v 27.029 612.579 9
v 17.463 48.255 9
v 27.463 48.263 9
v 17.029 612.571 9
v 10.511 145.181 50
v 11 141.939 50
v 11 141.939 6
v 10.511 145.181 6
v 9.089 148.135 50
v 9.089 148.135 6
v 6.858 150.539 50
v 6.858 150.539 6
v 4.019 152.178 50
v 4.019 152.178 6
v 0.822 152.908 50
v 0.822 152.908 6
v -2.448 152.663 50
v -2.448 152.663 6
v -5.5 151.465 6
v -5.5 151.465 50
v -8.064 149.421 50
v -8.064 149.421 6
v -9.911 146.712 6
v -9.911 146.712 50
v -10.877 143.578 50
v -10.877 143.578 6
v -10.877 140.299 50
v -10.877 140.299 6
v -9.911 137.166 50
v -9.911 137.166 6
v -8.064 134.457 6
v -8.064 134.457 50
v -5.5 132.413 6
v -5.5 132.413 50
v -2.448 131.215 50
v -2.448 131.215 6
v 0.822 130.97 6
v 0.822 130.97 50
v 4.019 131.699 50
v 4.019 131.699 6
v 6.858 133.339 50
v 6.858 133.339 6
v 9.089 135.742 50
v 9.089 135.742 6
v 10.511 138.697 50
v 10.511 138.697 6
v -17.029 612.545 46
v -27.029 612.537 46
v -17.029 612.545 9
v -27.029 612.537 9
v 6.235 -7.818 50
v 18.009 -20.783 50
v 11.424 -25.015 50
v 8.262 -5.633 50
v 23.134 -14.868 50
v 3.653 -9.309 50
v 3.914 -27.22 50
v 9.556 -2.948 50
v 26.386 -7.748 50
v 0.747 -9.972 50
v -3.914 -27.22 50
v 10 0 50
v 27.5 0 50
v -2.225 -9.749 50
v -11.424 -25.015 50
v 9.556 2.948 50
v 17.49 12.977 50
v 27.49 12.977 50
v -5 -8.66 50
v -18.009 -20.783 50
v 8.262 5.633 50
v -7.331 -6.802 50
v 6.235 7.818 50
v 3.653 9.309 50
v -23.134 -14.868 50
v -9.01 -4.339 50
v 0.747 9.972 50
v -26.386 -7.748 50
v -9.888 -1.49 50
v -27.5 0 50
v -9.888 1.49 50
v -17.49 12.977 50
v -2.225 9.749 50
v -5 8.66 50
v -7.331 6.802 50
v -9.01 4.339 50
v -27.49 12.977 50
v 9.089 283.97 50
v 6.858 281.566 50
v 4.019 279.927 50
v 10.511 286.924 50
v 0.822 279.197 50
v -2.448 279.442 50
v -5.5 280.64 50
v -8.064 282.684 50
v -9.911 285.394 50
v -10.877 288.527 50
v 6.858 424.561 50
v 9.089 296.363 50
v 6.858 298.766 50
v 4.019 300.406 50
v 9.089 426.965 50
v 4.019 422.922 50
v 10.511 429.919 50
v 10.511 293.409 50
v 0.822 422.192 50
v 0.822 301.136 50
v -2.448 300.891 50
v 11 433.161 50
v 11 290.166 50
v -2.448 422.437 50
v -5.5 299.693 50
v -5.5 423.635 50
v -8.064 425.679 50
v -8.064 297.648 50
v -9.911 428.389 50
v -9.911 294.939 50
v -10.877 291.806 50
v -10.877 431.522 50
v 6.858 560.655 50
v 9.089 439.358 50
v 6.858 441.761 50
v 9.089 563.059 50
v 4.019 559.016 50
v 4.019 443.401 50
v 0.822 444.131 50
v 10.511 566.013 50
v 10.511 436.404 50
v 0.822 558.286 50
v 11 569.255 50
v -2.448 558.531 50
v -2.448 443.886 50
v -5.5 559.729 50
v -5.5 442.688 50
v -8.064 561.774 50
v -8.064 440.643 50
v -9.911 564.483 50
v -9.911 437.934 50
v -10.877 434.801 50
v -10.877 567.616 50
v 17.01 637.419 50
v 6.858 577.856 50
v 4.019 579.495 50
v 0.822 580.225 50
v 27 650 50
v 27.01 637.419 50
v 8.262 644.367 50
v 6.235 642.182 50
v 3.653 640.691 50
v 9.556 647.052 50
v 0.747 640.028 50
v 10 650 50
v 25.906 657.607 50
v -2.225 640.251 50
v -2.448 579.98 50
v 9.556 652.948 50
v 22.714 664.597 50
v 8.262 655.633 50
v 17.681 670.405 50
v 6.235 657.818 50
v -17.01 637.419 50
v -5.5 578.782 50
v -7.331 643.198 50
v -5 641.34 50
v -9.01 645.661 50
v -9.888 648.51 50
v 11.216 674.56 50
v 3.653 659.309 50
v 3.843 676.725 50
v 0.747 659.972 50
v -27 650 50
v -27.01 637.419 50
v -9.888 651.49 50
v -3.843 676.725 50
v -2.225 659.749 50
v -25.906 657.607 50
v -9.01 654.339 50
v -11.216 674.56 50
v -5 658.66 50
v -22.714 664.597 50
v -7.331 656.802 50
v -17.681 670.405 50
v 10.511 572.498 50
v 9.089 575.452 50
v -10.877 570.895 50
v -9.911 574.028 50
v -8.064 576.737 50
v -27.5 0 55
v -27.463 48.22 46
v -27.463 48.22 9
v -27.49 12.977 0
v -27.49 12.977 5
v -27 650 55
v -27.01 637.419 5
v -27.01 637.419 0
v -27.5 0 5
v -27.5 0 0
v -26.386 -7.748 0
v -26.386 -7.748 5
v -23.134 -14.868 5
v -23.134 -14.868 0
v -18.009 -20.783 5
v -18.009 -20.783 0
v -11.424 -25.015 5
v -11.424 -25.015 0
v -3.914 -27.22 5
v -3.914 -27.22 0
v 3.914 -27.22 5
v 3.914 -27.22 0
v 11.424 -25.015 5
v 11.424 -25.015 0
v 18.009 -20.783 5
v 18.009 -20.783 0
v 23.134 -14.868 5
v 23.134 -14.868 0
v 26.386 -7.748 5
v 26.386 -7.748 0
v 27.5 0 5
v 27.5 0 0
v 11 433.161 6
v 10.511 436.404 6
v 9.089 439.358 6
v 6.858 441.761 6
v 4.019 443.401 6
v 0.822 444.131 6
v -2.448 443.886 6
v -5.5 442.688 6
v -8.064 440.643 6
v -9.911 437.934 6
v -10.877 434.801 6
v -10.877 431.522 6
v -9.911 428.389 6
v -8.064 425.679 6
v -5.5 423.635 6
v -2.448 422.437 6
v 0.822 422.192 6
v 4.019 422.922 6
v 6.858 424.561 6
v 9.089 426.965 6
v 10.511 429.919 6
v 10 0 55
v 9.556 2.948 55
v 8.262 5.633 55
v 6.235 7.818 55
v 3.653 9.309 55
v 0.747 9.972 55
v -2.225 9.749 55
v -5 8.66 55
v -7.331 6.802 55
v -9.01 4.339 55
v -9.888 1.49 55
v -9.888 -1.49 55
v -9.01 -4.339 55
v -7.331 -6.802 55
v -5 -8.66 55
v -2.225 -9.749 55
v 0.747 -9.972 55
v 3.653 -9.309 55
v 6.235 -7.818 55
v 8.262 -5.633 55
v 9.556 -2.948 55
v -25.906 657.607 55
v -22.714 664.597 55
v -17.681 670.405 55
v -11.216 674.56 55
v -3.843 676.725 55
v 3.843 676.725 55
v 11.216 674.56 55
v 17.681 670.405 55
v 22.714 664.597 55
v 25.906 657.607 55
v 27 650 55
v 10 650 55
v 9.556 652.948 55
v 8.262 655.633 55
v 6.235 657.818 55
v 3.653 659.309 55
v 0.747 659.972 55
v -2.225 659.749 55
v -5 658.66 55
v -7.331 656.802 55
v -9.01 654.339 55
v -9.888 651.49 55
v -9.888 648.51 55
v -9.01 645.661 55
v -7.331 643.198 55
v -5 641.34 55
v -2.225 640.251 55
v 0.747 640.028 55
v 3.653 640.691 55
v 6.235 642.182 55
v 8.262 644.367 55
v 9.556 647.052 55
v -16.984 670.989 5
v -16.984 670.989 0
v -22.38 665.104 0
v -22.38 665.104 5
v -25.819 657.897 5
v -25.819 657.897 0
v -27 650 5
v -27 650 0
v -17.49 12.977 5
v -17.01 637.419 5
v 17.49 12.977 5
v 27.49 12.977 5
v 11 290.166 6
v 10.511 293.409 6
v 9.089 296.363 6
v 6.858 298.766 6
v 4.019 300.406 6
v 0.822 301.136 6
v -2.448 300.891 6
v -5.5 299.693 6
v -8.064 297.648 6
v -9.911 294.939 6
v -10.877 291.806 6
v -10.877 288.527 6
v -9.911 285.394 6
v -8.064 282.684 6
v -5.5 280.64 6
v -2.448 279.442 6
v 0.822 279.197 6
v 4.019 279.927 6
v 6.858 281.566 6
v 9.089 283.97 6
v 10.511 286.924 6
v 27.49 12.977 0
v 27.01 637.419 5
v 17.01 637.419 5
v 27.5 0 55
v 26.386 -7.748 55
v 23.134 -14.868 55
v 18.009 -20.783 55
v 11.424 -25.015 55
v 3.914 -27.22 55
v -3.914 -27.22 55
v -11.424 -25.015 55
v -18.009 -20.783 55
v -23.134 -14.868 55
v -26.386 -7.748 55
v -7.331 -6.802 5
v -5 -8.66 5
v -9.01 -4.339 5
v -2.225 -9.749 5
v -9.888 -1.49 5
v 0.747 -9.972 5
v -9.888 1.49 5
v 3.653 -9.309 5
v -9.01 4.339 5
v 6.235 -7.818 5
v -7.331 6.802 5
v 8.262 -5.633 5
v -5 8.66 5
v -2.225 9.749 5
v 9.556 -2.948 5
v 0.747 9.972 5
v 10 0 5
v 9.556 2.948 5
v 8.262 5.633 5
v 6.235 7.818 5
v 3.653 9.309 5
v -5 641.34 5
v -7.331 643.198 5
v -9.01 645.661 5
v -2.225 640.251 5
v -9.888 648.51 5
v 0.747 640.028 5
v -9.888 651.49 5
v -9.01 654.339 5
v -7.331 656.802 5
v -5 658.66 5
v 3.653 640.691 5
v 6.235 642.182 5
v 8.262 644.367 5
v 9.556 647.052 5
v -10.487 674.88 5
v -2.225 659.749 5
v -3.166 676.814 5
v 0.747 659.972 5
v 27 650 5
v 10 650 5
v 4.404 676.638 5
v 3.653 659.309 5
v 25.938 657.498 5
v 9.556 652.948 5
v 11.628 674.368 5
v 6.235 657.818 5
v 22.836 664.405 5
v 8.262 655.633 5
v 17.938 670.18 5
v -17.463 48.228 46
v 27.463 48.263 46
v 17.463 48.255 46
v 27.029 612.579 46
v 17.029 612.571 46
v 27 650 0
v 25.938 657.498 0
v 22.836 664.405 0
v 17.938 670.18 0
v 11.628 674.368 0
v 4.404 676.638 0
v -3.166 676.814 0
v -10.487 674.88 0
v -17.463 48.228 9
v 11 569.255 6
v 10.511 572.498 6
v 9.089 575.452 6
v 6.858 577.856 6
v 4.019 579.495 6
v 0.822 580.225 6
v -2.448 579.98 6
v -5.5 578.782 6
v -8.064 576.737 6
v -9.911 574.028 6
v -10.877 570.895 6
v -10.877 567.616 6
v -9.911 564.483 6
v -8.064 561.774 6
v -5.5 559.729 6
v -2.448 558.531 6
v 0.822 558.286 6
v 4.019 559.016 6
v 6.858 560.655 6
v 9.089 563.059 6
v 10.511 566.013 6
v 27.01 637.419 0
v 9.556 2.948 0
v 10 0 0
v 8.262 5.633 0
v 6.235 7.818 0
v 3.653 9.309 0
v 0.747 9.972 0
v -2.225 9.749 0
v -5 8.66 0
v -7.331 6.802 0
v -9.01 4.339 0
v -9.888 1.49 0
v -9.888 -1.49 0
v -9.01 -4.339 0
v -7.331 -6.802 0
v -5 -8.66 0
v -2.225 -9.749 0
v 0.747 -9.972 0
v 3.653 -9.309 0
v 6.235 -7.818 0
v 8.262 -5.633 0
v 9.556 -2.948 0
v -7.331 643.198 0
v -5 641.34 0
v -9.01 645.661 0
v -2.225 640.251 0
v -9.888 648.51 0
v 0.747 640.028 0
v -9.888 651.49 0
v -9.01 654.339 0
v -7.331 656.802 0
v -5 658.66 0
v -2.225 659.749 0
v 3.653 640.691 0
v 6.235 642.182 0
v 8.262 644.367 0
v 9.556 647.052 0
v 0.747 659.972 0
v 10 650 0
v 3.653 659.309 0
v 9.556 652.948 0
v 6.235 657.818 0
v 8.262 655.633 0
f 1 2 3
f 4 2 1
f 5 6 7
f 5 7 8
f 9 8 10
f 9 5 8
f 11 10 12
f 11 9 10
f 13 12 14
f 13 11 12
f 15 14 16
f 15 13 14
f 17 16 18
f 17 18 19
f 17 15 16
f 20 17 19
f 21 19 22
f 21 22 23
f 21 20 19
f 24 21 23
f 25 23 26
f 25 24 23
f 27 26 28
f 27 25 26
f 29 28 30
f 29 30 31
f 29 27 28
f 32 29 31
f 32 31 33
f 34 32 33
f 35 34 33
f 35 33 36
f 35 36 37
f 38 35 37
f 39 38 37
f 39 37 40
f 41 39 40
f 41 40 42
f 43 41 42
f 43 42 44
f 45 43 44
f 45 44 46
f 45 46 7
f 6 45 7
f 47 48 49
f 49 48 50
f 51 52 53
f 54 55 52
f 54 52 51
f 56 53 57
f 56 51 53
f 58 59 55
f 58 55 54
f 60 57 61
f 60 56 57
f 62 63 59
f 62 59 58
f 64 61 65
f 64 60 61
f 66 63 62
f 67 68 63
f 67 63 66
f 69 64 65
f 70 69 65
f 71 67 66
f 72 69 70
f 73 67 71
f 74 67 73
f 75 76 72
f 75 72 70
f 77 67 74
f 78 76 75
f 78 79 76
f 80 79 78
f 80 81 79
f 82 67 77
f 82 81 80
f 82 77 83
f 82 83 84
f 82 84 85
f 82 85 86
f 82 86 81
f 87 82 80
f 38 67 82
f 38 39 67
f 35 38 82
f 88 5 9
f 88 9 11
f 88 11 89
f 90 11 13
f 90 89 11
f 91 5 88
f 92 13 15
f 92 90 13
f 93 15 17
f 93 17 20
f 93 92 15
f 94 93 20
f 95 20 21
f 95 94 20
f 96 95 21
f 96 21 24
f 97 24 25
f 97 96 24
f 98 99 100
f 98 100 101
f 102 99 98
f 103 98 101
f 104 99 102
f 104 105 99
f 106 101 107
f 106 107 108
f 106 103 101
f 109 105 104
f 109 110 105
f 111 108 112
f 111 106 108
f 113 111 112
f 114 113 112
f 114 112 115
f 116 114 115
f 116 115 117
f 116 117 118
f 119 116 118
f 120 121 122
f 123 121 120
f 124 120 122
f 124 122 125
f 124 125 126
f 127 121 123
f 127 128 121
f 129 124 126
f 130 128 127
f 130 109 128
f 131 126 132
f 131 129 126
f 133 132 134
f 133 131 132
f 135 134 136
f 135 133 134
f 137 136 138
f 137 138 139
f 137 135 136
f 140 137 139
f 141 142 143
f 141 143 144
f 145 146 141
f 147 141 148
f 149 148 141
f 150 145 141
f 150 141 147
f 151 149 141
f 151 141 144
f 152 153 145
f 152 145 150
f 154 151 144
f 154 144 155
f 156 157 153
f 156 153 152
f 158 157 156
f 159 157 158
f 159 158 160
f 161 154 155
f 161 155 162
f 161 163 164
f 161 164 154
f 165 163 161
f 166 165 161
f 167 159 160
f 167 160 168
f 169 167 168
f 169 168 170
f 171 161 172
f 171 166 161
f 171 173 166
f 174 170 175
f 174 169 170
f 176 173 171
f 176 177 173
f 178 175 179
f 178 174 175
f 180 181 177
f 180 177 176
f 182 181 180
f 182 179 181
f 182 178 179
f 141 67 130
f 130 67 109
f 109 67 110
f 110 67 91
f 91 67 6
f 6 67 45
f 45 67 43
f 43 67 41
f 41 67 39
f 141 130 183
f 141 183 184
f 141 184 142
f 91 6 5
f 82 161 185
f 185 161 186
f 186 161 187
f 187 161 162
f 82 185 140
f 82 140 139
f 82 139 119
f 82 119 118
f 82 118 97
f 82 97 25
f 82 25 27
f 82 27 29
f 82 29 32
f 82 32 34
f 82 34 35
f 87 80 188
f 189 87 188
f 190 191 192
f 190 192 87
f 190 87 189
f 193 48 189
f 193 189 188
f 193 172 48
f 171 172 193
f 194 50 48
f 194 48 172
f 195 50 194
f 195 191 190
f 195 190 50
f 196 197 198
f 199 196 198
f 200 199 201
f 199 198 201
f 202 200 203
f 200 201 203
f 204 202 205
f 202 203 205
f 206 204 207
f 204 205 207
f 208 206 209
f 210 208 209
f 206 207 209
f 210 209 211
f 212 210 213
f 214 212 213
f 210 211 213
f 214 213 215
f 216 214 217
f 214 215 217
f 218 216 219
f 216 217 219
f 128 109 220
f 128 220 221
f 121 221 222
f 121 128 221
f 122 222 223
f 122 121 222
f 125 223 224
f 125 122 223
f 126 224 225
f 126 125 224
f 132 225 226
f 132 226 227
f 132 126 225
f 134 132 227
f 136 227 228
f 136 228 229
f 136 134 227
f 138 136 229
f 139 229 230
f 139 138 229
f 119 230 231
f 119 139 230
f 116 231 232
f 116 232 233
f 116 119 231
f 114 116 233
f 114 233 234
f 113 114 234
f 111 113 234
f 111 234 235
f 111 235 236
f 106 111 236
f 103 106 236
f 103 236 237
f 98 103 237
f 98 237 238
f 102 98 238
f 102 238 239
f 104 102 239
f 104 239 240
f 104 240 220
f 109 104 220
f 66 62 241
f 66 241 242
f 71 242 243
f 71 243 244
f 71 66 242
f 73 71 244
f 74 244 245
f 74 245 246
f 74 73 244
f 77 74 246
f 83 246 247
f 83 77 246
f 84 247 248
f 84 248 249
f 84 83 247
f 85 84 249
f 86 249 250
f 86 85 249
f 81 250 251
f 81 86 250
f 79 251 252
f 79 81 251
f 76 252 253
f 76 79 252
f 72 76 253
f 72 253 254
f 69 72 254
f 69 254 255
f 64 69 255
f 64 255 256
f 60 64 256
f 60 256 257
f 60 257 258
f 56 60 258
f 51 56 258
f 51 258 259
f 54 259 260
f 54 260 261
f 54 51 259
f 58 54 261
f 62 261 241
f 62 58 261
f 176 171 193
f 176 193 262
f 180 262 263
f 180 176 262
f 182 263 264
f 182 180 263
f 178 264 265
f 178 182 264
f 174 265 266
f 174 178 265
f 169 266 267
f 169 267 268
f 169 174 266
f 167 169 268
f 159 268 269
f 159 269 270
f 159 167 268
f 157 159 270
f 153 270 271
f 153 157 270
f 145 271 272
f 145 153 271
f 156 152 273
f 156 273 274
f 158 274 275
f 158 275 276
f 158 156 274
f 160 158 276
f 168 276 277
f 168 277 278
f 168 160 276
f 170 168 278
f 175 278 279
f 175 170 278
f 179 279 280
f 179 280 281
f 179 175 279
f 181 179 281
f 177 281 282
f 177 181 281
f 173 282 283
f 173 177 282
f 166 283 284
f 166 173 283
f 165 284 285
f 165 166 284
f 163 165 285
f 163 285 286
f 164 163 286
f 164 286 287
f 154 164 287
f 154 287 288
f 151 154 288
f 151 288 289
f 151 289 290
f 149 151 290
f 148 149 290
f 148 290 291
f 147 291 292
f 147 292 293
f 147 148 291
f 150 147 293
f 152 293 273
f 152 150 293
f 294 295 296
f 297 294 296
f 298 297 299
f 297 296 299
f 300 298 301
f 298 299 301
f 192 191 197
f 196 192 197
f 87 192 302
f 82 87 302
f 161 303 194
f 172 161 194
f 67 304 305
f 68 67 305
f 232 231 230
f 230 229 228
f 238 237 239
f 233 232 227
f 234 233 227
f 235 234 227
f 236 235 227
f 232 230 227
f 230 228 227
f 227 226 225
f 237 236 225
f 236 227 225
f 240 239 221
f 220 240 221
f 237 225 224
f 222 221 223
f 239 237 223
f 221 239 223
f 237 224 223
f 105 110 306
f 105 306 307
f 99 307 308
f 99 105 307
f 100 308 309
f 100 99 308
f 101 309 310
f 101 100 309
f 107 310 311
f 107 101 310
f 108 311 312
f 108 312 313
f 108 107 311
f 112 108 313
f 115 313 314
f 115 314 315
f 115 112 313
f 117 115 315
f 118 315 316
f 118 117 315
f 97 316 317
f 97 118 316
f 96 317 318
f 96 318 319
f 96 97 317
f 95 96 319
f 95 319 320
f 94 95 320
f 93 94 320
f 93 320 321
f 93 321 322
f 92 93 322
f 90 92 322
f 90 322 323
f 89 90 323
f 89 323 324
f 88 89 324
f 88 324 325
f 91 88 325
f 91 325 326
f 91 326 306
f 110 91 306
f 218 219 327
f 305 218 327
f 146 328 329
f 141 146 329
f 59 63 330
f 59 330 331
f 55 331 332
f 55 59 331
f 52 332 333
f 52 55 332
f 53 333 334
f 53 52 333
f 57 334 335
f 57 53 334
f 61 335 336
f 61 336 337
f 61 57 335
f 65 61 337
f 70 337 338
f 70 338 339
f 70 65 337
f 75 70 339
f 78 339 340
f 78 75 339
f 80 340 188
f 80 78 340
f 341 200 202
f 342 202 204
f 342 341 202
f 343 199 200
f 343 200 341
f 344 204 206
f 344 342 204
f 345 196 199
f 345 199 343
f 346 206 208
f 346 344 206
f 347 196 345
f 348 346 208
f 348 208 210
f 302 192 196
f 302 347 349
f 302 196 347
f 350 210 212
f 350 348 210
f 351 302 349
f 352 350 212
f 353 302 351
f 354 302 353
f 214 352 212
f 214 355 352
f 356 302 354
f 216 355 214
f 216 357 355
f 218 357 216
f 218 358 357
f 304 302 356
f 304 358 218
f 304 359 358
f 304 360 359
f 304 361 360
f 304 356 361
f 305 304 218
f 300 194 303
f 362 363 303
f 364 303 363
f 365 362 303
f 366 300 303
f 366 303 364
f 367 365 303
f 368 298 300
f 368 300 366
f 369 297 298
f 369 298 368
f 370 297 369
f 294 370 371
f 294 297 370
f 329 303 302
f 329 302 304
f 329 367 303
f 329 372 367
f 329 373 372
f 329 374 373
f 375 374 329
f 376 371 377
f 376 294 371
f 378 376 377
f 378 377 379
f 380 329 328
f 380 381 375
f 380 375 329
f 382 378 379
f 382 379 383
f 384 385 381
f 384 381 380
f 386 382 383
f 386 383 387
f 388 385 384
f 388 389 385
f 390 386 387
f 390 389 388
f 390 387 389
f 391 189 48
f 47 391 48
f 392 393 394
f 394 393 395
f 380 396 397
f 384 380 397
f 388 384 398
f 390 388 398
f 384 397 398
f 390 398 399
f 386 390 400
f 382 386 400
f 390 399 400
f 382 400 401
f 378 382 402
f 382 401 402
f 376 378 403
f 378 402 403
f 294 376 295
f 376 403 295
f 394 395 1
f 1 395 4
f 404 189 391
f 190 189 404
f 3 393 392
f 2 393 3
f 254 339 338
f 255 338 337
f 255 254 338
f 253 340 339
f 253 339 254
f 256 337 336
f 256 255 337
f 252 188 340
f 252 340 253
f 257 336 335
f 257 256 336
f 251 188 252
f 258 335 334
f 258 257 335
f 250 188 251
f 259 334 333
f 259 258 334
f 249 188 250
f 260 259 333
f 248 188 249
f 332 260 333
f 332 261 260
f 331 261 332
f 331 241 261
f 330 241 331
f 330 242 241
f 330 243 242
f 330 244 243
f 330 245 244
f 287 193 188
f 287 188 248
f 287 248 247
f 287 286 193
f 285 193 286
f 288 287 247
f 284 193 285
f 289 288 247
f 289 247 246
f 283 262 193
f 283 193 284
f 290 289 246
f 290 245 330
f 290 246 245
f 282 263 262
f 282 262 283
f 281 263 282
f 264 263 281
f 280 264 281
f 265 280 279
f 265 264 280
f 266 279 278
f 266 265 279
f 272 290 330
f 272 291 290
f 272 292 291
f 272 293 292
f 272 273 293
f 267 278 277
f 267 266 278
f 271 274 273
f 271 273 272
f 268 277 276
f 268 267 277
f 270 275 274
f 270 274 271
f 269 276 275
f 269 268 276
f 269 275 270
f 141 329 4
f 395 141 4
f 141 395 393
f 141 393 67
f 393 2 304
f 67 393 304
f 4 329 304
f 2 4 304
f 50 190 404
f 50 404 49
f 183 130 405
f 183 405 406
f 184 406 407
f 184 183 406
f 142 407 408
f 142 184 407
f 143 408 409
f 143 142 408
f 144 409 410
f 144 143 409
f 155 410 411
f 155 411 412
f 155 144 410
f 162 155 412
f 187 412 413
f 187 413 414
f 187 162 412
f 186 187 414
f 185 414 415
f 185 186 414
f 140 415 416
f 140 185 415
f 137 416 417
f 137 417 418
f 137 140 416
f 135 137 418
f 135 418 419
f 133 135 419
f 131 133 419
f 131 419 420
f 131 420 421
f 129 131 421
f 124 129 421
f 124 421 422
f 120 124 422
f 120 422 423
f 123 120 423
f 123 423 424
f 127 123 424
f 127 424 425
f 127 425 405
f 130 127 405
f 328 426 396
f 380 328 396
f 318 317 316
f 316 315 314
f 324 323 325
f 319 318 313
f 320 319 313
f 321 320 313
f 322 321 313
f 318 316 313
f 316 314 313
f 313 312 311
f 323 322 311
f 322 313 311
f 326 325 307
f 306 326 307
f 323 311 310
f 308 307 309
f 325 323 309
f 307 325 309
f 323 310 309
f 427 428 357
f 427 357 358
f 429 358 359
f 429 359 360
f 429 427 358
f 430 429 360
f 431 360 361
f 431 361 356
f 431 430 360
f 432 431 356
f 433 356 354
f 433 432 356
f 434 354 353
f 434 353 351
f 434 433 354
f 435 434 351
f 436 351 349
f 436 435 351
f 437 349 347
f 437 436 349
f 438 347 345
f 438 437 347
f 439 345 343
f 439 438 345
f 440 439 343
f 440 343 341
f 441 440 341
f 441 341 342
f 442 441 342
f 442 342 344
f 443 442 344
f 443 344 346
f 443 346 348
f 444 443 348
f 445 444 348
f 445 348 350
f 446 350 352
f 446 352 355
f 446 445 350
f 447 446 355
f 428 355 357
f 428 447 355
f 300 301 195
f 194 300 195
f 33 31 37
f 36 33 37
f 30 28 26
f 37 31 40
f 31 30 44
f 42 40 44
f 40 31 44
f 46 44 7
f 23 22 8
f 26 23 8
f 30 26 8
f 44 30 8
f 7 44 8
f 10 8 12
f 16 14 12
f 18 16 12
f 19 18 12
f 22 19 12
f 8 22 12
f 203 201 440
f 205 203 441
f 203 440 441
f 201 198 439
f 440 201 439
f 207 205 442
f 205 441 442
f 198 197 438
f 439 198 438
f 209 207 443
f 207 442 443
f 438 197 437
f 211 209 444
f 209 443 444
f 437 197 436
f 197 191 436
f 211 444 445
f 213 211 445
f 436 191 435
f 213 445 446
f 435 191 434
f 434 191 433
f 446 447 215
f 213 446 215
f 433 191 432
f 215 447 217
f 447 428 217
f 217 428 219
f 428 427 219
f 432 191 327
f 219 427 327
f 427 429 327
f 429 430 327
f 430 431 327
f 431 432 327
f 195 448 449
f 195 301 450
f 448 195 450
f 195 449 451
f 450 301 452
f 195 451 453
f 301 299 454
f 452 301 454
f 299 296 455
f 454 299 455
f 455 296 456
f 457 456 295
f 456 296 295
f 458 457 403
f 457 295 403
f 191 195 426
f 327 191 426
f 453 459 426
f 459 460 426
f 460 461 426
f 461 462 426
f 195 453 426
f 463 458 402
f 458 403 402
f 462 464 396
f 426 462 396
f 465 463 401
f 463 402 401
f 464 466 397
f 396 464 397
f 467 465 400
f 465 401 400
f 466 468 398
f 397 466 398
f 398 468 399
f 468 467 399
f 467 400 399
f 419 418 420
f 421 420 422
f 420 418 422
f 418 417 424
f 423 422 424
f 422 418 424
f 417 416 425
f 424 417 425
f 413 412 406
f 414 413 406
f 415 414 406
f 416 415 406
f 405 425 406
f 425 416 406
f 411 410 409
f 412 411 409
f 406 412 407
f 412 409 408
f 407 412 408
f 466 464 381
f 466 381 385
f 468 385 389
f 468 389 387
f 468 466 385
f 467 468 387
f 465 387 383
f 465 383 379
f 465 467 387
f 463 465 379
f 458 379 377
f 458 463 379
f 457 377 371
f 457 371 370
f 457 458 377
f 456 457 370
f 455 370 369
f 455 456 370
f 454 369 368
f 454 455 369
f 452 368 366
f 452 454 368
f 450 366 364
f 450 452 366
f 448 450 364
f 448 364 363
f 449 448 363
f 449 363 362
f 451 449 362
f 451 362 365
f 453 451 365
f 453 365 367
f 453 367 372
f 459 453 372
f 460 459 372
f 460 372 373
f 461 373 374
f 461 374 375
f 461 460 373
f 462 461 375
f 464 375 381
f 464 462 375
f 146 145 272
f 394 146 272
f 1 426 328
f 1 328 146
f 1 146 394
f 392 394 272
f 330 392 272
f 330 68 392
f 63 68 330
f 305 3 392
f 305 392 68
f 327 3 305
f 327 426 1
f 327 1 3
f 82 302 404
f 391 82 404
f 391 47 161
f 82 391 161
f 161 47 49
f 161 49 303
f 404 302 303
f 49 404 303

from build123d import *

# Parameters (mm, degrees)
SKETCH1_R               = 10
BOSS_EXTRUDE2_DEPTH     = 5
BOSS_EXTRUDE3_DEPTH     = 55
BOSS_EXTRUDE4_START     = 50
SKETCH1_4_R             = 10
BOSS_EXTRUDE4_DEPTH     = 5
CUT_EXTRUDE1_DEPTH      = 682.432576538
CUT_EXTRUDE1_DEPTH_BACK = 682.432576538
SKETCH3_W               = 37
SKETCH3_H               = 564.316545641
SKETCH4_R               = 11
BOSS_EXTRUDE5_DEPTH     = 49


with BuildPart() as part:
    # Sketch1 → Boss-Extrude2 (new body)
    with BuildSketch(Plane.XY):
        with BuildLine():
            Line((27.00967764, 637.419067567), (27, 650))
            ThreePointArc((27, 650), (11.628325989, 674.367643191), (-16.983854422, 670.989251749))
            ThreePointArc((-16.983854422, 670.989251749), (-24.367643191, 661.628325989), (-27, 650))
            Line((-27, 650), (-27.00967764, 637.419067567))
            Line((-27.00967764, 637.419067567), (-17.00967764, 637.419067567))
            Line((-17.00967764, 637.419067567), (-17.490017949, 12.976666451))
            Line((-17.490017949, 12.976666451), (-27.490017949, 12.976666451))
            Line((-27.490017949, 12.976666451), (-27.5, 0))
            ThreePointArc((-27.5, 0), (0, -27.5), (27.5, 0))
            Line((27.5, 0), (27.490017949, 12.976666451))
            Line((27.490017949, 12.976666451), (17.490017949, 12.976666451))
            Line((17.490017949, 12.976666451), (17.00967764, 637.419067567))
            Line((17.00967764, 637.419067567), (27.00967764, 637.419067567))
        make_face()
        Circle(SKETCH1_R, mode=Mode.SUBTRACT)
        with Locations((0, 650)):
            Circle(SKETCH1_R, mode=Mode.SUBTRACT)
    extrude(amount=BOSS_EXTRUDE2_DEPTH)

    # Sketch1<3> → Boss-Extrude3 (add)
    with BuildSketch(Plane.XY):
        Polygon((27.490017949, 12.976666451), (27.00967764, 637.419067567), (17.00967764, 637.419067567), (17.490017949, 12.976666451), align=None)
        Polygon((-17.00967764, 637.419067567), (-27.00967764, 637.419067567), (-27.490017949, 12.976666451), (-17.490017949, 12.976666451), align=None)
    extrude(amount=BOSS_EXTRUDE3_DEPTH)

    # Sketch1<4> → Boss-Extrude4 (add)
    with BuildSketch(Plane.XY.offset(BOSS_EXTRUDE4_START)):
        with BuildLine():
            Line((27.00967764, 637.419067567), (27, 650))
            ThreePointArc((27, 650), (11.628325989, 674.367643191), (-16.983854422, 670.989251749))
            ThreePointArc((-16.983854422, 670.989251749), (-24.367643191, 661.628325989), (-27, 650))
            Line((-27, 650), (-27.00967764, 637.419067567))
            Line((-27.00967764, 637.419067567), (-17.00967764, 637.419067567))
            Line((-17.00967764, 637.419067567), (-17.490017949, 12.976666451))
            Line((-17.490017949, 12.976666451), (-27.490017949, 12.976666451))
            Line((-27.490017949, 12.976666451), (-27.5, 0))
            ThreePointArc((-27.5, 0), (0, -27.5), (27.5, 0))
            Line((27.5, 0), (27.490017949, 12.976666451))
            Line((27.490017949, 12.976666451), (17.490017949, 12.976666451))
            Line((17.490017949, 12.976666451), (17.00967764, 637.419067567))
            Line((17.00967764, 637.419067567), (27.00967764, 637.419067567))
        make_face()
        Circle(SKETCH1_4_R, mode=Mode.SUBTRACT)
        with Locations((0, 650)):
            Circle(SKETCH1_4_R, mode=Mode.SUBTRACT)
    extrude(amount=BOSS_EXTRUDE4_DEPTH)

    # Sketch3 → Cut-Extrude1 (cut, two sides: drawn at the far end of the back side and taken through both)
    with BuildSketch(Plane(origin=(27.499983728, 0.021153834, 0), x_dir=(0, 0, -1), z_dir=(0.9999997041421432, 0.0007692305416477979, 0)).offset(-CUT_EXTRUDE1_DEPTH_BACK)):
        with Locations((-27.5, 330.399690719)):
            Rectangle(SKETCH3_W, SKETCH3_H)
    extrude(amount=CUT_EXTRUDE1_DEPTH + CUT_EXTRUDE1_DEPTH_BACK, mode=Mode.SUBTRACT)

    # Sketch4 → Boss-Extrude5 (add)
    with BuildSketch(Plane.XY.offset(55)):
        with Locations((0, 569.255461643)):
            Circle(SKETCH4_R)
        with Locations((0, 433.161322259)):
            Circle(SKETCH4_R)
        with Locations((0, 290.166334704)):
            Circle(SKETCH4_R)
        with Locations((0, 141.938836299)):
            Circle(SKETCH4_R)
    extrude(amount=-BOSS_EXTRUDE5_DEPTH)


solid = part.part
